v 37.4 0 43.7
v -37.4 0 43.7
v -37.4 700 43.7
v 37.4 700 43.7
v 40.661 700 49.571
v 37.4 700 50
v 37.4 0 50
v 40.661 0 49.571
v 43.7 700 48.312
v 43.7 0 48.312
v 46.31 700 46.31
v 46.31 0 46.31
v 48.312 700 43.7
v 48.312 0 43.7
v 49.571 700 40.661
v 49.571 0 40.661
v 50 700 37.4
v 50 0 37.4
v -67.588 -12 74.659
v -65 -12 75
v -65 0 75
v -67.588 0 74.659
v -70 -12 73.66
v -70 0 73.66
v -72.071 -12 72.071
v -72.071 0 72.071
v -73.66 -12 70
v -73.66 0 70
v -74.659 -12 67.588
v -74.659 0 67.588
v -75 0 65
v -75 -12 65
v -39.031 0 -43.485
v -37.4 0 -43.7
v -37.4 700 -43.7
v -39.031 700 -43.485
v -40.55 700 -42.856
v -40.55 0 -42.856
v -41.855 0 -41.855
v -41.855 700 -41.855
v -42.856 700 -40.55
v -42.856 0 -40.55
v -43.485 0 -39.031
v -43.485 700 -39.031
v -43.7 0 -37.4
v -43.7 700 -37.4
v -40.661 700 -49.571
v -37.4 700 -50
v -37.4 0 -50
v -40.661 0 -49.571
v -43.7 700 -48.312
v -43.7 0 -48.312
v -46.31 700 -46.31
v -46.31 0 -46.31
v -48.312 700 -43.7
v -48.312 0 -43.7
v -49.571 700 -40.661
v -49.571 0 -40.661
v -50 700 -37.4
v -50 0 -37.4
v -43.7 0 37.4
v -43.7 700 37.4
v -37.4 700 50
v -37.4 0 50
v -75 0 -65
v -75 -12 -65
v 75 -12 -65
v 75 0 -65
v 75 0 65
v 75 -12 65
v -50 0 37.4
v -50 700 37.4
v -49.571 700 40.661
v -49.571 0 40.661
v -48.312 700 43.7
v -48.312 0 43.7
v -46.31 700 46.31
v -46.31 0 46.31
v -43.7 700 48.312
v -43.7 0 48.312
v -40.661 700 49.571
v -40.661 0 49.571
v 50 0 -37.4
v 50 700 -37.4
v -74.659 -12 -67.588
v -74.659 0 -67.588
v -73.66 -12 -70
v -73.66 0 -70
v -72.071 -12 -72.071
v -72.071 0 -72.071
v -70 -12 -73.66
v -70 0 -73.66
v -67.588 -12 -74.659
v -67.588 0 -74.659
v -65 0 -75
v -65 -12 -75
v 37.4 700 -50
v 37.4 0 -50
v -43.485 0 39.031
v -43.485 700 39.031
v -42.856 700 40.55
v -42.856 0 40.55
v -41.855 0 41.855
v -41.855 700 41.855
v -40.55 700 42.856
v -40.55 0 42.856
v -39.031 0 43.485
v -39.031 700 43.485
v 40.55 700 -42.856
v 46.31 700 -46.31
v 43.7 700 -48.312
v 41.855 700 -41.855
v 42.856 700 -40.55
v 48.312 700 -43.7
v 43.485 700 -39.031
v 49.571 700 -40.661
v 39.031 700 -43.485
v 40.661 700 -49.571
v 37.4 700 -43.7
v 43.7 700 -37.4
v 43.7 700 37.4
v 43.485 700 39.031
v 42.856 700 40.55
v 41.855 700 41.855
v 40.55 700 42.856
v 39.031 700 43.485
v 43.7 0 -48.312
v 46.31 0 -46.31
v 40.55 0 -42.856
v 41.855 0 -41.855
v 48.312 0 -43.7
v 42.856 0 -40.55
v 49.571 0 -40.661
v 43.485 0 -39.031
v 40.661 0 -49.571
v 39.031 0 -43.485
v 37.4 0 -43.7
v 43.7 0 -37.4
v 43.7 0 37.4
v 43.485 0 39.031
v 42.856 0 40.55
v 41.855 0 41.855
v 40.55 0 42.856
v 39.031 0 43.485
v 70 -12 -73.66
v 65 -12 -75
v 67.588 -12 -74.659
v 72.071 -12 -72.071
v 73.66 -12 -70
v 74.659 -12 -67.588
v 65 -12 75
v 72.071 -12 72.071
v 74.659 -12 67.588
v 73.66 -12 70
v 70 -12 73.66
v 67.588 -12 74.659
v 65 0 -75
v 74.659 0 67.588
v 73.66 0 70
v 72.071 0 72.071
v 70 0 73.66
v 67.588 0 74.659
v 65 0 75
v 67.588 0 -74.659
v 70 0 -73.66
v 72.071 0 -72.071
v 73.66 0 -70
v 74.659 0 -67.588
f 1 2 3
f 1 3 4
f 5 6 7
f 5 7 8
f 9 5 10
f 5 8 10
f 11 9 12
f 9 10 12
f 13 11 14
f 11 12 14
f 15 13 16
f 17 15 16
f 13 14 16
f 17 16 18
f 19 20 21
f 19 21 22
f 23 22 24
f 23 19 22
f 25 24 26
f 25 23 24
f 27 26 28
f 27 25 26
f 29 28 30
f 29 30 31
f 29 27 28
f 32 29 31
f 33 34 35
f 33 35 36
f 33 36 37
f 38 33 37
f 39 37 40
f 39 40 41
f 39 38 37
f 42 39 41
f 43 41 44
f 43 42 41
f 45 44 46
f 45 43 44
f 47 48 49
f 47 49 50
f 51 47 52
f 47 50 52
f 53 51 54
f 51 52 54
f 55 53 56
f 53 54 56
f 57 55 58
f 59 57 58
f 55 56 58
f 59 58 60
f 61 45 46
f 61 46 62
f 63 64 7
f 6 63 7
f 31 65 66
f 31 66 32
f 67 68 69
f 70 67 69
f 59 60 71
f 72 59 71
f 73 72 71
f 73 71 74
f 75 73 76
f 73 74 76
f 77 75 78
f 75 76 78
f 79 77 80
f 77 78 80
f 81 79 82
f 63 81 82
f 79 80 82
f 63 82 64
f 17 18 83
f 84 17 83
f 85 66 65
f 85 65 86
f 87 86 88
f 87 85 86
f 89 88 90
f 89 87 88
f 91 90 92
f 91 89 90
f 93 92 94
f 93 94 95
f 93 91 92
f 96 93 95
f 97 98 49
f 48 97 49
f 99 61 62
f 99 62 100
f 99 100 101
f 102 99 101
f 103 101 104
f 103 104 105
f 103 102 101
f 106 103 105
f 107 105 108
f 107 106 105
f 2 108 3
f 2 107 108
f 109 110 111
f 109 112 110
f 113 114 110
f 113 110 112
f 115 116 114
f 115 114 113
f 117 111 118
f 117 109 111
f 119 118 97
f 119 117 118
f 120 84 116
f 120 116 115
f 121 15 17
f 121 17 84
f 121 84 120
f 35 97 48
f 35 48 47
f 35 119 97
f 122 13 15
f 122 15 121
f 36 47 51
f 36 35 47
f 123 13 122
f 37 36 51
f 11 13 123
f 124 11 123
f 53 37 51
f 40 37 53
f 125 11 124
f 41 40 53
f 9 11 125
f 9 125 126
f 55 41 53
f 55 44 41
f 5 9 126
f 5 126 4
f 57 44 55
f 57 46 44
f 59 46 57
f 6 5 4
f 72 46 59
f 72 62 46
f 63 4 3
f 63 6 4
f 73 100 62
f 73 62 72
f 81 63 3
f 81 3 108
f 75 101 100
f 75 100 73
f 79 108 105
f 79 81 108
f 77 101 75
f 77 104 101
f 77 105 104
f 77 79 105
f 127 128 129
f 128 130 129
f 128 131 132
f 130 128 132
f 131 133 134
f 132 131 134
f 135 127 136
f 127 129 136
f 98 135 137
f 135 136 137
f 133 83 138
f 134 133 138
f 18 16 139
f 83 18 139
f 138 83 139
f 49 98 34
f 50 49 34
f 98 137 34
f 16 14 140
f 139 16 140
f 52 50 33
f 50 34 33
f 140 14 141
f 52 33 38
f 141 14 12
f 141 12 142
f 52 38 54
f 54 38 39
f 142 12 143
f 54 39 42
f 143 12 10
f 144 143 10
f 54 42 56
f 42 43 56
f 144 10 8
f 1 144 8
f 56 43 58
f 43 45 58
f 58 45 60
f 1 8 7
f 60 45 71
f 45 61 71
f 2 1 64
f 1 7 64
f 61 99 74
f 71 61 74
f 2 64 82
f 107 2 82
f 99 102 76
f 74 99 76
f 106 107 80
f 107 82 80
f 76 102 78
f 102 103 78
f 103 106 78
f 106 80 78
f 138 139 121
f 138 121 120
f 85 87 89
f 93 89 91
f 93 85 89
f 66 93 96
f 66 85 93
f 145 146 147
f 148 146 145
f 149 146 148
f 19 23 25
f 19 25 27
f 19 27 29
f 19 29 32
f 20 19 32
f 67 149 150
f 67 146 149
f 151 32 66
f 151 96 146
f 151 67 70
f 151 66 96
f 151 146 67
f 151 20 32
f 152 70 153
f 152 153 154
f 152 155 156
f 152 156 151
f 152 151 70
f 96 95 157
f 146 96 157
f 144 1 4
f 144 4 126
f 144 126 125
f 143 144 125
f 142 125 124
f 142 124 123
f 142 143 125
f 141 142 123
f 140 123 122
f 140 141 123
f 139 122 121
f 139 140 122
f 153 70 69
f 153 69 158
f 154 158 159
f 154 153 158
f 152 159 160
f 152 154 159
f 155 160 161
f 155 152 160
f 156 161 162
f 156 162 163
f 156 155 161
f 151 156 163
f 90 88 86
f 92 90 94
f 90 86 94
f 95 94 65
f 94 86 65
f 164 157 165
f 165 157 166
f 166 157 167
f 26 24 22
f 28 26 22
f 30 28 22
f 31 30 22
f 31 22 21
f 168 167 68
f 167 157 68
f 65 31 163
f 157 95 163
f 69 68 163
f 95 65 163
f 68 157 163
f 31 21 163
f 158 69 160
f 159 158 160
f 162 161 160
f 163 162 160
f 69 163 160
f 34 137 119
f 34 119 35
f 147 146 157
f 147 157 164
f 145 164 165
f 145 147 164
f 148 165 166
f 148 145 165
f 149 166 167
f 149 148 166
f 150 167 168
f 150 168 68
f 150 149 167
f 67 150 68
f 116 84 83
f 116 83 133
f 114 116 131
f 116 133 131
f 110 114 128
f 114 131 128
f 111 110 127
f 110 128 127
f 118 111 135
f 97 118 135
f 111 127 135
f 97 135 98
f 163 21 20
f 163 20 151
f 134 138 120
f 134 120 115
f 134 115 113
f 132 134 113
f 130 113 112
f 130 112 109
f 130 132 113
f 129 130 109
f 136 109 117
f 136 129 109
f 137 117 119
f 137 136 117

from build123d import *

# Parameters (mm, degrees)
TUBE_SQUARE_100_X_100_X_6_3_1_DEPTH = 700
SKETCH12_W                          = 150
SKETCH12_H                          = 150
BASE_FLANGE1_DEPTH                  = 12
BREAK_CORNER1_START                 = -12
BREAK_CORNER1_DEPTH                 = 12


# Read off the part's stored shape, not the designer's step: Break-Corner1
# Sheet-metal steps are written as plain solids
with BuildPart() as part:
    # Sketch11 → Tube (square) 100 X 100 X 6.3(1) (new body)
    with BuildSketch(Plane(origin=(0, 0, 0), x_dir=(-1, 0, 0), z_dir=(0, 1, 0))):
        with BuildLine():
            Line((-37.4, -50), (37.4, -50))
            ThreePointArc((37.4, -50), (46.309545443, -46.309545443), (50, -37.4))
            Line((50, -37.4), (50, 37.4))
            ThreePointArc((50, 37.4), (46.309545443, 46.309545443), (37.4, 50))
            Line((37.4, 50), (-37.4, 50))
            ThreePointArc((-37.4, 50), (-46.309545443, 46.309545443), (-50, 37.4))
            Line((-50, 37.4), (-50, -37.4))
            ThreePointArc((-50, -37.4), (-46.309545443, -46.309545443), (-37.4, -50))
        make_face()
        with BuildLine():
            Line((-37.4, -43.7), (37.4, -43.7))
            ThreePointArc((37.4, -43.7), (41.854772721, -41.854772721), (43.7, -37.4))
            Line((43.7, -37.4), (43.7, 37.4))
            ThreePointArc((43.7, 37.4), (41.854772721, 41.854772721), (37.4, 43.7))
            Line((37.4, 43.7), (-37.4, 43.7))
            ThreePointArc((-37.4, 43.7), (-41.854772721, 41.854772721), (-43.7, 37.4))
            Line((-43.7, 37.4), (-43.7, -37.4))
            ThreePointArc((-43.7, -37.4), (-41.854772721, -41.854772721), (-37.4, -43.7))
        make_face(mode=Mode.SUBTRACT)
    extrude(amount=TUBE_SQUARE_100_X_100_X_6_3_1_DEPTH)


with BuildPart() as body_2:
    # Sketch12 → Base-Flange1 (new body)
    with BuildSketch(Plane.XZ):
        Rectangle(SKETCH12_W, SKETCH12_H)
    extrude(amount=BASE_FLANGE1_DEPTH)

    # Break-Corner1 outline → Break-Corner1 (cut)
    with BuildSketch(Plane(origin=(0, 0, 0), x_dir=(1, 0, 0), z_dir=(0, 1, 0)).offset(BREAK_CORNER1_START)):
        with BuildLine():
            ThreePointArc((-75, 65), (-72.071067812, 72.071067812), (-65, 75))
            Line((-65, 75), (-75, 75))
            Line((-75, 75), (-75, 65))
        make_face()
        with BuildLine():
            Line((75, 75), (65, 75))
            ThreePointArc((65, 75), (72.071067812, 72.071067812), (75, 65))
            Line((75, 65), (75, 75))
        make_face()
        with BuildLine():
            ThreePointArc((-65, -75), (-72.071067812, -72.071067812), (-75, -65))
            Line((-75, -65), (-75, -75))
            Line((-75, -75), (-65, -75))
        make_face()
        with BuildLine():
            Line((75, -75), (75, -65))
            ThreePointArc((75, -65), (72.071067812, -72.071067812), (65, -75))
            Line((65, -75), (75, -75))
        make_face()
    extrude(amount=BREAK_CORNER1_DEPTH, mode=Mode.SUBTRACT)


solid = Compound([part.part, body_2.part])
